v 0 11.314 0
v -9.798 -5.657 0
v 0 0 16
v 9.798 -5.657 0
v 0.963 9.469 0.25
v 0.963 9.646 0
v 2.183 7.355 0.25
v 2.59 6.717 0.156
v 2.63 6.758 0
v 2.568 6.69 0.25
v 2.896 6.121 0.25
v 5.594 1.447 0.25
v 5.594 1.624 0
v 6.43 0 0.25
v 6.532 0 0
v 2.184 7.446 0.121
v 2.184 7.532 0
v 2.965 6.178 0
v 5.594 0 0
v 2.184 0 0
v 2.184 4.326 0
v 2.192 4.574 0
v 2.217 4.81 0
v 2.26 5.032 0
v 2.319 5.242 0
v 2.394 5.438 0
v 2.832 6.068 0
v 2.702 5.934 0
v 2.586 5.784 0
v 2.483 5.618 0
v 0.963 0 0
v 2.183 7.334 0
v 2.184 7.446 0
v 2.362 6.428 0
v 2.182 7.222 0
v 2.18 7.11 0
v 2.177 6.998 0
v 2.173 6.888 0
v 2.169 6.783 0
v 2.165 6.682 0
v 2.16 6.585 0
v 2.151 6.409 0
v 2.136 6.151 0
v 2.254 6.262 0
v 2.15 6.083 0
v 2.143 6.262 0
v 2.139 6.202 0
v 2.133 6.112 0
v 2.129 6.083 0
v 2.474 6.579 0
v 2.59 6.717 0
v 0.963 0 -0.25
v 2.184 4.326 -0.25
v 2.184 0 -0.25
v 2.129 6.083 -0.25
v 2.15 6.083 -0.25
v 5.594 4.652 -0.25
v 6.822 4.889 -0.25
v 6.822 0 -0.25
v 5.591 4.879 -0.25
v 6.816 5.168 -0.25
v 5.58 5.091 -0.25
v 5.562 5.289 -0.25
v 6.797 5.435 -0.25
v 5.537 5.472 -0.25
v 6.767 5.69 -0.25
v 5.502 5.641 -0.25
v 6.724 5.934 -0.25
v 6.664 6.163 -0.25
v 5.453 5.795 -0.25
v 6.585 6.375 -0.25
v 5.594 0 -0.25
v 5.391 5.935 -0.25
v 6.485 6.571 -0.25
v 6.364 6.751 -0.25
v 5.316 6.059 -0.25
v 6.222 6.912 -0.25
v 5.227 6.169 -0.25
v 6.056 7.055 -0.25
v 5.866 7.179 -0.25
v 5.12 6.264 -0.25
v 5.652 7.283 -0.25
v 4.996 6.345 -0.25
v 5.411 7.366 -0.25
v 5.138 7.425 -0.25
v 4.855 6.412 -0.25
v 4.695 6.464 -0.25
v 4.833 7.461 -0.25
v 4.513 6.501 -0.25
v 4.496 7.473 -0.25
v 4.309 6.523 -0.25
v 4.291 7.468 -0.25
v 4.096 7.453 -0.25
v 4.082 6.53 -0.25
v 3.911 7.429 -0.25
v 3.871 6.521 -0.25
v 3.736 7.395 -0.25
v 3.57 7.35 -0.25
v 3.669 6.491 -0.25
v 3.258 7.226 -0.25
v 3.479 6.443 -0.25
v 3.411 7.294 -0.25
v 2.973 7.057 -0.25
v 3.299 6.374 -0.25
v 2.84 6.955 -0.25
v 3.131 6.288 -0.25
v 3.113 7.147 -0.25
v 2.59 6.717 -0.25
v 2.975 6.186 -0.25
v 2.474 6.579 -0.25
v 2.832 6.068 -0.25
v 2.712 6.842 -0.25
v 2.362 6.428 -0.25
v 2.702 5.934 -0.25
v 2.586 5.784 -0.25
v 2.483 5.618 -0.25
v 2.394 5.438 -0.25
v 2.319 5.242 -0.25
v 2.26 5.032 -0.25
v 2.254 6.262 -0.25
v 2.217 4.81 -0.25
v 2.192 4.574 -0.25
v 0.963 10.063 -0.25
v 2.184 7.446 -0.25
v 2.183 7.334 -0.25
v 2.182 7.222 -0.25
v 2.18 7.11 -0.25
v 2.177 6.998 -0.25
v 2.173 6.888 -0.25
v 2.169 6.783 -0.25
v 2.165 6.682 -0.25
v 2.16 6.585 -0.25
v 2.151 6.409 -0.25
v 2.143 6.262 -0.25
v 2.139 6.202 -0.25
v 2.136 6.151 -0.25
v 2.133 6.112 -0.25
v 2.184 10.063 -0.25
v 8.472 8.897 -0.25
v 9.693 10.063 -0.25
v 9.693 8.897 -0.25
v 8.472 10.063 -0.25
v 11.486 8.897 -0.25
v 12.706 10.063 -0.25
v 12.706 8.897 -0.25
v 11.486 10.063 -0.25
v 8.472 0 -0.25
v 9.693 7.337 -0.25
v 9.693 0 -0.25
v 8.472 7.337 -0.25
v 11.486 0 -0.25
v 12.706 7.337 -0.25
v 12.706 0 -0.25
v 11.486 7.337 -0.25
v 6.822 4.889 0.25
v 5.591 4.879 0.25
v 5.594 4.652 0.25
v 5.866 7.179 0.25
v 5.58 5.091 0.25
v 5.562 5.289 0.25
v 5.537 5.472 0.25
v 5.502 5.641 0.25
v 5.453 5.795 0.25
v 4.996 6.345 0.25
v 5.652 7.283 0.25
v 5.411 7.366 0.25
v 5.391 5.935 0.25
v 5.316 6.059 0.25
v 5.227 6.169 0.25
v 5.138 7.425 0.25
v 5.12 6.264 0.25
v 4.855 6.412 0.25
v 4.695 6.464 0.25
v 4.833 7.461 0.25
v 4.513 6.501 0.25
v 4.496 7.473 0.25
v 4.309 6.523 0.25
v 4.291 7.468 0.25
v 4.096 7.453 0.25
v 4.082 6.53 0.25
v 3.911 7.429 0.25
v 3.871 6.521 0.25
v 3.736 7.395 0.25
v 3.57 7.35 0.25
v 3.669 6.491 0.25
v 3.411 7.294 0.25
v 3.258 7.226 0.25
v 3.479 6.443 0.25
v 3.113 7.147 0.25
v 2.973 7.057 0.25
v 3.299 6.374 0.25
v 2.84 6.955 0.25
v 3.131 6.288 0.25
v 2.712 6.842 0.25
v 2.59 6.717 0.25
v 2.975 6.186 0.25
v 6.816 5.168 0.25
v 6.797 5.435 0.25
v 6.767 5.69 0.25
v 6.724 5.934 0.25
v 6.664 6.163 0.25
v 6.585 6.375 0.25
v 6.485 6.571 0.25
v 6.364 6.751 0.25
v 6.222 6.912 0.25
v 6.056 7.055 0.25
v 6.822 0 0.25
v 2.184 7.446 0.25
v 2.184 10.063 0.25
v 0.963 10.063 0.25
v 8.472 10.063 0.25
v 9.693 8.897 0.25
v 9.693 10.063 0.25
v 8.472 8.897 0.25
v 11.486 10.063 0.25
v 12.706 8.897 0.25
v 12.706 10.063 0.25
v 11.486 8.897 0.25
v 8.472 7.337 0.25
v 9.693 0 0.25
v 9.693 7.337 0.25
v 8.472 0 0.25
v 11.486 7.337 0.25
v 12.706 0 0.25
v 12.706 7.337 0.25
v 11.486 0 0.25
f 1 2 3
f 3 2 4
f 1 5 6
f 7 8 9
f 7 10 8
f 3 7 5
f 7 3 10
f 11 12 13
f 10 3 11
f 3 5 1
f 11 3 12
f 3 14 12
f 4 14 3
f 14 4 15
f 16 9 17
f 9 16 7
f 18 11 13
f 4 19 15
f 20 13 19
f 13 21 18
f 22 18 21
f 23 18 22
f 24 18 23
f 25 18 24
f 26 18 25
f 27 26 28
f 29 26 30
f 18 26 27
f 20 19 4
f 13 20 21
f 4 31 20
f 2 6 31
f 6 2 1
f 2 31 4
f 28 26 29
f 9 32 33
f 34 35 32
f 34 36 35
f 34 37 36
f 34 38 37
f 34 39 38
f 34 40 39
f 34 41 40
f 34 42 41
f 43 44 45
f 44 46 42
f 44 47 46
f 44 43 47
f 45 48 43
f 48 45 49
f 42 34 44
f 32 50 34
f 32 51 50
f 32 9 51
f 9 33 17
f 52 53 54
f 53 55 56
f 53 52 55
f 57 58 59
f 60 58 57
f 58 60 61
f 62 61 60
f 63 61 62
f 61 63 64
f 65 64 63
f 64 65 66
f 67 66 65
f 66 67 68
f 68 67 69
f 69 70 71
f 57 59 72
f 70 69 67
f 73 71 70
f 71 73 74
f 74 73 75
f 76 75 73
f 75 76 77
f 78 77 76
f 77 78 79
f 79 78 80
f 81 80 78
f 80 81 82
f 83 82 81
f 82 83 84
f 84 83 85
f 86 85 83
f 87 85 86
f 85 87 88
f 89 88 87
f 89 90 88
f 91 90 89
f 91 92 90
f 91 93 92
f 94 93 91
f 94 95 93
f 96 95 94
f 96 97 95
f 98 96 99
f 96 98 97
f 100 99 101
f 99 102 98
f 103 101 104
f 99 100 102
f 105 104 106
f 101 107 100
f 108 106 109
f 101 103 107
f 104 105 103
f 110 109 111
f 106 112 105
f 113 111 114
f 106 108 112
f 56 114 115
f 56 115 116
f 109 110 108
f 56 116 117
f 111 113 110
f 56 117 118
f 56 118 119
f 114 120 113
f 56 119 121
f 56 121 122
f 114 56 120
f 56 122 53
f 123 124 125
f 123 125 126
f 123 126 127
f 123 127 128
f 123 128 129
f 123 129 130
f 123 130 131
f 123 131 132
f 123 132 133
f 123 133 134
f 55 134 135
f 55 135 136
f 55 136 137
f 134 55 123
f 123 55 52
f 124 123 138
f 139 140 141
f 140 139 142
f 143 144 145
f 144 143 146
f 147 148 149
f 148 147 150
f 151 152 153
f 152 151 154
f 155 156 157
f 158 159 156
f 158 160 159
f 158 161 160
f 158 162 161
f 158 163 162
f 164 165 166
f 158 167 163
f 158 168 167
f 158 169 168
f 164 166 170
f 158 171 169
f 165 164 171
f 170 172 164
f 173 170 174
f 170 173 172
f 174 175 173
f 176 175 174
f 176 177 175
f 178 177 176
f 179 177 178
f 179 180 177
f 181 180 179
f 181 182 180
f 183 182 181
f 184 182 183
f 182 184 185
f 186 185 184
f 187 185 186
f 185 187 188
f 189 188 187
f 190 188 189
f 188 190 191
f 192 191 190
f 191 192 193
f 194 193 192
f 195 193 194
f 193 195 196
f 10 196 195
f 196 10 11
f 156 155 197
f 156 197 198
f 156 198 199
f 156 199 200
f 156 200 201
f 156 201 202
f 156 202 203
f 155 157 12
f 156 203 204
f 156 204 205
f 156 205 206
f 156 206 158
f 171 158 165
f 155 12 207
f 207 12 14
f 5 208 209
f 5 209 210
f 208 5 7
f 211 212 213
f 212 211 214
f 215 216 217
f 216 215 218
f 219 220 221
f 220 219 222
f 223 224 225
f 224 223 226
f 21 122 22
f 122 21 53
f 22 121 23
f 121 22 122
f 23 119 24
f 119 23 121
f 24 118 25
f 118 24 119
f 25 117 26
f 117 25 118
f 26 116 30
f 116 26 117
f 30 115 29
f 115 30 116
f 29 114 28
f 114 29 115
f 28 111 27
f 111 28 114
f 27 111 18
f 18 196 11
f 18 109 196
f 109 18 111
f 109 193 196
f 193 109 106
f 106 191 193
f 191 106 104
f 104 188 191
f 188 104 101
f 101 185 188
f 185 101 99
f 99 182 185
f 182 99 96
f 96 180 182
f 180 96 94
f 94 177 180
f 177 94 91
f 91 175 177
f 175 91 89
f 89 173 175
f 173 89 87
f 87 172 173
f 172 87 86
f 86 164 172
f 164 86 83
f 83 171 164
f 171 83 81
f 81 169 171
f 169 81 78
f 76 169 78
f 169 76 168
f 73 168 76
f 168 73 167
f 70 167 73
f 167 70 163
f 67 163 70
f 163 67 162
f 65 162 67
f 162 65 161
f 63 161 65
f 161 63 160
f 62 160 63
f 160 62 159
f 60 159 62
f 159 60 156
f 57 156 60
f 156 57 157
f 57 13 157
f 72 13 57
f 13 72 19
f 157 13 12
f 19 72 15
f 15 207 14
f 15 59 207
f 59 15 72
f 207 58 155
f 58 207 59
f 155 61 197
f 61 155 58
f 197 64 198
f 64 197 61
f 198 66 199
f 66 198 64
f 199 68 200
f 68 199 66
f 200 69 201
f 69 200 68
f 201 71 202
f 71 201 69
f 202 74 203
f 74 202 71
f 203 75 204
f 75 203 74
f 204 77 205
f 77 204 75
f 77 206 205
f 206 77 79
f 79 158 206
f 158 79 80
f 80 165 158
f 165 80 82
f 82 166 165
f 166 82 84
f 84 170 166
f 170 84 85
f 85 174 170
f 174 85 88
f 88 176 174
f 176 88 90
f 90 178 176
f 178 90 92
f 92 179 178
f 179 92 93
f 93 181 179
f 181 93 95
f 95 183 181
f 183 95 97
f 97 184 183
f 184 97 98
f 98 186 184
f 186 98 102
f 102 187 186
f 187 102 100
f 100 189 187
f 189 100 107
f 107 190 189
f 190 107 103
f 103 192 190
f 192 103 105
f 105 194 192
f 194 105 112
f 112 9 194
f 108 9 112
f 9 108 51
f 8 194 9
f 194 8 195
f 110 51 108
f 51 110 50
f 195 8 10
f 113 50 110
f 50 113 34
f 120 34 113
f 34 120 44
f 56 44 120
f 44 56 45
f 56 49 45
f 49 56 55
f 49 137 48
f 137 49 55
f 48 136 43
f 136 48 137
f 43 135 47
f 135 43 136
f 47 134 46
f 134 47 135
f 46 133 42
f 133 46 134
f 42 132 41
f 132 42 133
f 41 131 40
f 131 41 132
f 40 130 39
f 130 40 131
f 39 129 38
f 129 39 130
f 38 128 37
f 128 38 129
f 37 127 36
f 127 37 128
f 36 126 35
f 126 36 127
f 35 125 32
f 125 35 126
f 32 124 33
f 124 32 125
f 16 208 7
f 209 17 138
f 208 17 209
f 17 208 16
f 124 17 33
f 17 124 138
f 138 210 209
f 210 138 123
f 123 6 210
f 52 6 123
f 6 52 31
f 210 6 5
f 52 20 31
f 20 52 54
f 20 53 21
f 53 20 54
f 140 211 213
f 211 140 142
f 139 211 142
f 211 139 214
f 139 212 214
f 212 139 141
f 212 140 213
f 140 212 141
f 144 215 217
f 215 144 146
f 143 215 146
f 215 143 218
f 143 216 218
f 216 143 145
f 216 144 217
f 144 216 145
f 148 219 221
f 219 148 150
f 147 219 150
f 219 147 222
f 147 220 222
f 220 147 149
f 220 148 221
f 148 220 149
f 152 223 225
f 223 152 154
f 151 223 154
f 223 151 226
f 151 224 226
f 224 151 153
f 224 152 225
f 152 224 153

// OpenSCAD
//tetrahedron

//length of a side
//trying to make this 16 mm tall
a = 19.5959179423;

one = "1";
two = "2";
three = "3";
four = "4";
font = "Liberation Sans";

//top point Z-value in relation to a
w = sqrt(-0.0833333333333333*pow(a,2) + pow(sqrt(3)*a/6 + 0.577350269189626*a,2));

points = [[0, a/sqrt(3), 0], [-a/2, -a/(2*sqrt(3)), 0], [a/2, -a/(2*sqrt(3)), 0], [0, 0, w]];
faces = [[0,3,1], [0, 1, 2], [2, 1, 3], [0, 2, 3]];
edges = [[0, 1], [0, 2], [0, 3], [1, 2], [1, 3], [2, 3]];

polyhedron(points, triangles=faces, edges=edges);
//translate([0, 0, 20]) {
//linear_extrude(height = 325) {
//      text(text = str(one), font = font, size = 45, halign = "center");
//     }
//}
translate([0, 0, -.25]) {
linear_extrude(height=.5) {text("hii",font=font);}}
